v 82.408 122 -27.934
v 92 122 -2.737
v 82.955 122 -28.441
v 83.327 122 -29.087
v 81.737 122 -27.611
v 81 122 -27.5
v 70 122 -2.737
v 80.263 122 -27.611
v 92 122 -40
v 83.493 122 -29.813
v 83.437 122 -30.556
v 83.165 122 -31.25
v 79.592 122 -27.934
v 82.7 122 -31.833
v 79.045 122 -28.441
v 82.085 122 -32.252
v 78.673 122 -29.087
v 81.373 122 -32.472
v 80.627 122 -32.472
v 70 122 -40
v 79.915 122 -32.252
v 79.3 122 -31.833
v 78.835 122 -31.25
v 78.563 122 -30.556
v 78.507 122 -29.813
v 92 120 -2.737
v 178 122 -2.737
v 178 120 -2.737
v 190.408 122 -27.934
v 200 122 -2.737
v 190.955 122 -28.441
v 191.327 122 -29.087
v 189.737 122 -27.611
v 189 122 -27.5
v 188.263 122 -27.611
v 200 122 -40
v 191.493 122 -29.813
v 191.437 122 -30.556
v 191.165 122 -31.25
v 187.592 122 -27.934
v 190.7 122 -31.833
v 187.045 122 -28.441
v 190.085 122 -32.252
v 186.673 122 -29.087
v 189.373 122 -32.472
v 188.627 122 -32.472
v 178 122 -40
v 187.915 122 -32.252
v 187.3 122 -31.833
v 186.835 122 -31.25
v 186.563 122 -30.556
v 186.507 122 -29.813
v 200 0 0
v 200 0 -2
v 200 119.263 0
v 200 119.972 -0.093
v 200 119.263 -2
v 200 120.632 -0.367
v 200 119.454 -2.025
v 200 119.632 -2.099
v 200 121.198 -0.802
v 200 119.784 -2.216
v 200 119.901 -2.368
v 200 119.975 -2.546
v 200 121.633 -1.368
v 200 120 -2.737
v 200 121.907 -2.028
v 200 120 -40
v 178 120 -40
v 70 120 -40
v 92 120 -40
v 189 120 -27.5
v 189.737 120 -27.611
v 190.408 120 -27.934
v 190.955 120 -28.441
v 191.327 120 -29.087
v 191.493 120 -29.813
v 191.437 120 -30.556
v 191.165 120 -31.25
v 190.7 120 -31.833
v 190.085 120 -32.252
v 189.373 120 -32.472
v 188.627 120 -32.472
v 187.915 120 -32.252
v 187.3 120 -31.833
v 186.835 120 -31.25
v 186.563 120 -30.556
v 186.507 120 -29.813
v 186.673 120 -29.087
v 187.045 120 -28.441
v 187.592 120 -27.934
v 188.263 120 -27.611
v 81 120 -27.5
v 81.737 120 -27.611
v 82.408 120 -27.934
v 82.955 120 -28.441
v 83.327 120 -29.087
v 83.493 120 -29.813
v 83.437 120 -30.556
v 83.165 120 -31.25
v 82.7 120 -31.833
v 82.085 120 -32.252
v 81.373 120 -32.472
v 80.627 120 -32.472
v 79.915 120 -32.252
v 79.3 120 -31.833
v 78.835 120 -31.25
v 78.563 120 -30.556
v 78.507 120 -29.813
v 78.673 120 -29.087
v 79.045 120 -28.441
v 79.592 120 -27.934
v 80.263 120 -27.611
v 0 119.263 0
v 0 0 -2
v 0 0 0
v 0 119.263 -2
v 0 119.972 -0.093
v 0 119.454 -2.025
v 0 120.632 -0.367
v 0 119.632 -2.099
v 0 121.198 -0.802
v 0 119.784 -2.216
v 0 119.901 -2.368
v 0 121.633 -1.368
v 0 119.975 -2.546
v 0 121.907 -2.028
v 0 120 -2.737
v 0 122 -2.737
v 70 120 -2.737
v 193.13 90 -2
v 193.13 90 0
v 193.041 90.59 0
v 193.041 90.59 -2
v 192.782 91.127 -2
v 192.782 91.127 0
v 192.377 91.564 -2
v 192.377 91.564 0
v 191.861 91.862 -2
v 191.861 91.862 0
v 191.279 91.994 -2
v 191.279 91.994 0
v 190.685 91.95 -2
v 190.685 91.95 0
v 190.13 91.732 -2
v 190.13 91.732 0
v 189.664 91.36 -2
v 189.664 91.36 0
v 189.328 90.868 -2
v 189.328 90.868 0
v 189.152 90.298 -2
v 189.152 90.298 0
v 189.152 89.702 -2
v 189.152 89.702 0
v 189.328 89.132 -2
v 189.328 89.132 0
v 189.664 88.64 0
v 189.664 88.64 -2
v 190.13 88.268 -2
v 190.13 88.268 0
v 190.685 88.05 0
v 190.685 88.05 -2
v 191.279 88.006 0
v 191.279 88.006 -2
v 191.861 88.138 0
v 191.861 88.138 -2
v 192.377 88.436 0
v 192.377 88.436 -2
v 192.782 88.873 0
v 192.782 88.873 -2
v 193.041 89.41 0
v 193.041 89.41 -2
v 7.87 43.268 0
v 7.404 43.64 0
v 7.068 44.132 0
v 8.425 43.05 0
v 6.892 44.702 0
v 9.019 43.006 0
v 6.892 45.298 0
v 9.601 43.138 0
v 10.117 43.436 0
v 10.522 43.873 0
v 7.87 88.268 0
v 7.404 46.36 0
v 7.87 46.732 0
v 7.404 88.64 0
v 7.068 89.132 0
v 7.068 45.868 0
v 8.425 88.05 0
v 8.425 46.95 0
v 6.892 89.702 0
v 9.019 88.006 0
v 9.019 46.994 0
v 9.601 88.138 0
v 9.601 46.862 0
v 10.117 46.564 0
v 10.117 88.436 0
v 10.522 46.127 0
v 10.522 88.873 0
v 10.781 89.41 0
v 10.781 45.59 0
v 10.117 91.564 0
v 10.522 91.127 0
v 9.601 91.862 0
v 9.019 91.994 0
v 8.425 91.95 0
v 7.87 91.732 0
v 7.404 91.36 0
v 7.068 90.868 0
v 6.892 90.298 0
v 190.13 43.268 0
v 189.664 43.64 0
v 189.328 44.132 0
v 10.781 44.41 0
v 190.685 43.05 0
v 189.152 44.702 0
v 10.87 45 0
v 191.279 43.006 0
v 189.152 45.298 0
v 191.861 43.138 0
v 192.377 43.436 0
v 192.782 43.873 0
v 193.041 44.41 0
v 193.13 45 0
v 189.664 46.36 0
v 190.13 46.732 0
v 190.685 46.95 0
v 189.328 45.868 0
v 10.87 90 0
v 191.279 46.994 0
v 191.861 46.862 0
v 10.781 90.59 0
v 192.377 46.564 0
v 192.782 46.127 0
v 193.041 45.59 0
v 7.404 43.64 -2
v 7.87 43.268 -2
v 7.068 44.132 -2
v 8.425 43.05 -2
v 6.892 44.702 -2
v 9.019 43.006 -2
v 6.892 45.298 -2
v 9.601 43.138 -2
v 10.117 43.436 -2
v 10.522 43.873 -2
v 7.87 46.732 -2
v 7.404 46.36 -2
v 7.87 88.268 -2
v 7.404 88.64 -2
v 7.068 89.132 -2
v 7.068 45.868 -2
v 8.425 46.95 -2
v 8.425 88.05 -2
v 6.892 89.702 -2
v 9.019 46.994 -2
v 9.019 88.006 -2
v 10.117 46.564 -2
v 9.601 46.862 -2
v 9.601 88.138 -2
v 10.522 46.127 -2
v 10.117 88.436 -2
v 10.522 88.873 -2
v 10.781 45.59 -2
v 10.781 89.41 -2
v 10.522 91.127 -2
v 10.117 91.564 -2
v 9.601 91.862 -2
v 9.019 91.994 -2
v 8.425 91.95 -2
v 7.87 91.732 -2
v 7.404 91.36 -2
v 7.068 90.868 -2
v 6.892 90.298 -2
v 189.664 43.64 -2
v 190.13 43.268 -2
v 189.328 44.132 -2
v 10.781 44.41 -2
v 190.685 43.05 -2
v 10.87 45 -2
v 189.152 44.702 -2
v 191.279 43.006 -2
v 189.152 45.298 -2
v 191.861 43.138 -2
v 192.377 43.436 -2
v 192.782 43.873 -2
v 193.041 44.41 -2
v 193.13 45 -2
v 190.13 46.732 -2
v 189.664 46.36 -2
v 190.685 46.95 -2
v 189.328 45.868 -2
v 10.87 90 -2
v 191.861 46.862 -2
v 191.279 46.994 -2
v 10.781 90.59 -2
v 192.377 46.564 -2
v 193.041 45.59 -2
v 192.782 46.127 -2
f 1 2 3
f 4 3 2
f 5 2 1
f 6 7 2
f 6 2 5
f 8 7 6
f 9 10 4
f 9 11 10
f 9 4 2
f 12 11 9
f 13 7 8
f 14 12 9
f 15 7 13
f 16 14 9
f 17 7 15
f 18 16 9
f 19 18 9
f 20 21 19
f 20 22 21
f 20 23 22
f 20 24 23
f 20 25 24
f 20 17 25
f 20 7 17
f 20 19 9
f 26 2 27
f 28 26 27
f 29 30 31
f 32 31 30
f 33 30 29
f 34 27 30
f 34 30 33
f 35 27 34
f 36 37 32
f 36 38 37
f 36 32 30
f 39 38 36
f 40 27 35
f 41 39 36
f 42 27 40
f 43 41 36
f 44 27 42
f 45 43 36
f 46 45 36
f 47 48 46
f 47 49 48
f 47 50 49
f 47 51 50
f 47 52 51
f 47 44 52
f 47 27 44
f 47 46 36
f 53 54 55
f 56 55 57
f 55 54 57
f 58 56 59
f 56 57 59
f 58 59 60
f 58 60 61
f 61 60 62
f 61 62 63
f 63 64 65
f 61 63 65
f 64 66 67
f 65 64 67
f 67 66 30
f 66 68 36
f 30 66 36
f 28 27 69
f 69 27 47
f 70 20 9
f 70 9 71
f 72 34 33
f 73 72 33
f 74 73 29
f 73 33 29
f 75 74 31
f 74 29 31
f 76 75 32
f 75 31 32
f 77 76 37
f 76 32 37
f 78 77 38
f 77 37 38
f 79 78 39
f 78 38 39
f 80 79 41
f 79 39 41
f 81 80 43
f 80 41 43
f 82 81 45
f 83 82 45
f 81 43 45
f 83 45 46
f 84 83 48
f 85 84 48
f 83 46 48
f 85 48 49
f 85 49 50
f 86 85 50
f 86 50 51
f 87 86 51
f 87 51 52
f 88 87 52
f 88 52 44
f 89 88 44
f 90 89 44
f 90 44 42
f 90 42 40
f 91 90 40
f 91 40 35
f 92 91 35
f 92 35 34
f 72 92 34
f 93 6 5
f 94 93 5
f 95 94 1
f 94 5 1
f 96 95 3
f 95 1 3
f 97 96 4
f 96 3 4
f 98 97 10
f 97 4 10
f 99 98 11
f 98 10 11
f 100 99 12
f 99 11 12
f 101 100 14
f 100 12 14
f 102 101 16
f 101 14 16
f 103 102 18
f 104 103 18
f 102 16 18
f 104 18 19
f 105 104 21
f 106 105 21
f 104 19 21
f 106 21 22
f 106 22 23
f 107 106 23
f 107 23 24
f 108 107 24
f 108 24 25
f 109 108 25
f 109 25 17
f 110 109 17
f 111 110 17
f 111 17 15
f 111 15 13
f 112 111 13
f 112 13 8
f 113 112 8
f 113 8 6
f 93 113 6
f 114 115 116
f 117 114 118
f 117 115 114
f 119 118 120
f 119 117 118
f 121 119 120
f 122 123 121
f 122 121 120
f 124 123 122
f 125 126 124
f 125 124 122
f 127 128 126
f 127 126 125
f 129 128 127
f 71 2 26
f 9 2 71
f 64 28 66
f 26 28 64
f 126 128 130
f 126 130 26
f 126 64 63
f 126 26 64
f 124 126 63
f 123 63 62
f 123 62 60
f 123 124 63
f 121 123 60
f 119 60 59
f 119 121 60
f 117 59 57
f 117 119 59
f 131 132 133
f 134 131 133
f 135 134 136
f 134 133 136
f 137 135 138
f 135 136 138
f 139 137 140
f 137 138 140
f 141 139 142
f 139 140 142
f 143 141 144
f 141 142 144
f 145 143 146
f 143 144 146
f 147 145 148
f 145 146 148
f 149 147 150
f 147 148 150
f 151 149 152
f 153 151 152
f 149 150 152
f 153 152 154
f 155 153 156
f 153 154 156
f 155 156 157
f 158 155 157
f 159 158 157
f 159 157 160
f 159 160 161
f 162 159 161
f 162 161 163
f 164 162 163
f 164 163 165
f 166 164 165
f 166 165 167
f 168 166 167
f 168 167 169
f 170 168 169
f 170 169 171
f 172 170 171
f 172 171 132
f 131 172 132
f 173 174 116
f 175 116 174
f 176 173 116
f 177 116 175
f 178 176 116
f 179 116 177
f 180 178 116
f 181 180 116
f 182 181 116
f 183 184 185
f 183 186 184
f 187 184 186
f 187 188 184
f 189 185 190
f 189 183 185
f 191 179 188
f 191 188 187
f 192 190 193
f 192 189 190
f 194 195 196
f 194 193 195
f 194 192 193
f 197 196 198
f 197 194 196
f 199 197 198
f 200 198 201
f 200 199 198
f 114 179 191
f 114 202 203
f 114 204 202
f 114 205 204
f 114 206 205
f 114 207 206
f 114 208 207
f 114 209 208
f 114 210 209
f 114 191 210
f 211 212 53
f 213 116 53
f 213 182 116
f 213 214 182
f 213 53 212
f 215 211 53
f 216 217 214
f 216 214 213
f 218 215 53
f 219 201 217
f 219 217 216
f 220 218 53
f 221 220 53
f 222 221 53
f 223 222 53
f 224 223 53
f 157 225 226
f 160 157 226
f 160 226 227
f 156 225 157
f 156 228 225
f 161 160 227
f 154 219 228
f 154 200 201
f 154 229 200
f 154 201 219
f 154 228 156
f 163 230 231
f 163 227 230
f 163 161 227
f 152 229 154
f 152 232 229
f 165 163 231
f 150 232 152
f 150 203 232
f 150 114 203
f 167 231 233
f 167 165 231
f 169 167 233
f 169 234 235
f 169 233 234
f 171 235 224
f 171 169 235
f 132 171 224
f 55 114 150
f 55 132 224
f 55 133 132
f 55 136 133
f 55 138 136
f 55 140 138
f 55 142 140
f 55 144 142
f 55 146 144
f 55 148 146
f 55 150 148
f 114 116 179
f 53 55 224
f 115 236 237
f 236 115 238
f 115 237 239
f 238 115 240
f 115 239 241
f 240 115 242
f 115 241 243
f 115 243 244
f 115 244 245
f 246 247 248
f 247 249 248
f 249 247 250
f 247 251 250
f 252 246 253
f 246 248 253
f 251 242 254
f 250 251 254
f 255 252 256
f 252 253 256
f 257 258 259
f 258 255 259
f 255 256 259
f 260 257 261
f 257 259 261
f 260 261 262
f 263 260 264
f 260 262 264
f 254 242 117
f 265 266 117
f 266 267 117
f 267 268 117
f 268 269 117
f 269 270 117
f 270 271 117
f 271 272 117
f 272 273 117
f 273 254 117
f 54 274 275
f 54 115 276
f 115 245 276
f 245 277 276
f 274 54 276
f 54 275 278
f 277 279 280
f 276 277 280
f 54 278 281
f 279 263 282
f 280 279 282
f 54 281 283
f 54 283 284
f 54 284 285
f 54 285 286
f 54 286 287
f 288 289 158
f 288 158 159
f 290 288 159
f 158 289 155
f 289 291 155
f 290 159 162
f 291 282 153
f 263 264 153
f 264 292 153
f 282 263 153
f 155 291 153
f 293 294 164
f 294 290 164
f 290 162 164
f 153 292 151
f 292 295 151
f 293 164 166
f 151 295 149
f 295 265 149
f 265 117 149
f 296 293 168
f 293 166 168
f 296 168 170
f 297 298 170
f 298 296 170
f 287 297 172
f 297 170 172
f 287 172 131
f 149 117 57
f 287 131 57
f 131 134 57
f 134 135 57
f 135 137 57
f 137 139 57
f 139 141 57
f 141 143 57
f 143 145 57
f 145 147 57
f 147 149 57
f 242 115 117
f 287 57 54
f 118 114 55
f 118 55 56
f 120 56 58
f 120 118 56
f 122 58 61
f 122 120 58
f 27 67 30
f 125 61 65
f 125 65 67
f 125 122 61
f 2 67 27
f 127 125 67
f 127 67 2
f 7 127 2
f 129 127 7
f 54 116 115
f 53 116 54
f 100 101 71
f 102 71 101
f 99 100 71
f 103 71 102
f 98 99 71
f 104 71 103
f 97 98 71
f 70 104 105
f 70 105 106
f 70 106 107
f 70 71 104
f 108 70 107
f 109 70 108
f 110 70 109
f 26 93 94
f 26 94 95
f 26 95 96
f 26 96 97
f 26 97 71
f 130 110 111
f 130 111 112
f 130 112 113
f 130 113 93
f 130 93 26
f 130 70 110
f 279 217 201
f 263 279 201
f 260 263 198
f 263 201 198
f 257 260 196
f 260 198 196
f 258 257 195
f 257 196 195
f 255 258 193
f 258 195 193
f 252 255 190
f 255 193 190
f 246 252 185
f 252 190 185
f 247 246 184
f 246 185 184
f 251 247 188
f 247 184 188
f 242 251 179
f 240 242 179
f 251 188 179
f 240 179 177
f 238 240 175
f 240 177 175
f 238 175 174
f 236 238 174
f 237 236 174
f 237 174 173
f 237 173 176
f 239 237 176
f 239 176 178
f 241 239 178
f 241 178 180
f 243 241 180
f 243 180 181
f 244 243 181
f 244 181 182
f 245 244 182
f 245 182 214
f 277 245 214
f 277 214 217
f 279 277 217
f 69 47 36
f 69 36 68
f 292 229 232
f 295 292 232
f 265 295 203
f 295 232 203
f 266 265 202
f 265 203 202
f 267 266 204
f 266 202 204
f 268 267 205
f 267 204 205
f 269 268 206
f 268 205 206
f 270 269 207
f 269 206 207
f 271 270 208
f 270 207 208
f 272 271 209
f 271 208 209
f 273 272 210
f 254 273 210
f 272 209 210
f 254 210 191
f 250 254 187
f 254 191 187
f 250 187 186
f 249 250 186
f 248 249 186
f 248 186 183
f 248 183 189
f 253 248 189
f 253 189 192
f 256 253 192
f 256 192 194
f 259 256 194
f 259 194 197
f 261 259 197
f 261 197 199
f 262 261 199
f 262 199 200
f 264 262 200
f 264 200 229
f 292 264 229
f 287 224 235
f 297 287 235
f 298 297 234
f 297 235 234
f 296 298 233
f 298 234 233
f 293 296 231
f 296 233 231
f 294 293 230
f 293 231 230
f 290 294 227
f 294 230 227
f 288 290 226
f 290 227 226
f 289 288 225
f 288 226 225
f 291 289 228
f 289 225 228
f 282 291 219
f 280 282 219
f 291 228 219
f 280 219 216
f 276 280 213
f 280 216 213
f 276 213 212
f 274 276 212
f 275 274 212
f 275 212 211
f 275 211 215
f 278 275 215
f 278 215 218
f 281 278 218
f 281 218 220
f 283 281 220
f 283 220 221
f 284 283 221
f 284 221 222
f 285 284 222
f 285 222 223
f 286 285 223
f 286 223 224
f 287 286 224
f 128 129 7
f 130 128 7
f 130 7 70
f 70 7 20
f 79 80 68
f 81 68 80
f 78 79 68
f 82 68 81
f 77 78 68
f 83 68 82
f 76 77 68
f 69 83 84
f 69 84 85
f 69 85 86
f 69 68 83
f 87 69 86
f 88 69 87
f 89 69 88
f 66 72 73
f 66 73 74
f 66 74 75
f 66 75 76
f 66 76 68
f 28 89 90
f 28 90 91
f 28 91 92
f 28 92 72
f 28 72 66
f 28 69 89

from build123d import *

# Parameters (mm, degrees)
SKETCH2_W                    = 200
SKETCH2_H                    = 120
BASE_FLANGE1_DEPTH           = 2
CUT_EXTRUDE1_REACH           = 235.247
SKETCH7_R                    = 2
EDGE_FLANGE1_STRIP_W         = 9.4732
EDGE_FLANGE1_STRIP_H         = 2
EDGE_FLANGE1_STRIP_CUT_DEPTH = 200
EDGE_FLANGE1_DEPTH           = 200
CUT_EXTRUDE2_REACH           = 239.664
SKETCH11_R                   = 2.5
SKETCH11_W                   = 86
SKETCH11_H                   = 37.2634
SKETCH11_W_2                 = 70


# Sheet-metal steps are written as plain solids
with BuildPart() as part:
    # Sketch2 → Base-Flange1 (new body)
    with BuildSketch(Plane.XY):
        with Locations((100, 60)):
            Rectangle(SKETCH2_W, SKETCH2_H)
    extrude(amount=-BASE_FLANGE1_DEPTH)

    # Sketch7 → Cut-Extrude1 (cut, up to next)
    with BuildSketch(Plane.XY, mode=Mode.PRIVATE) as cut_extrude1_sk1:
        with Locations((8.87, 90)):
            Circle(SKETCH7_R)
    cut_extrude1_tool1 = extrude(cut_extrude1_sk1.sketch, amount=-CUT_EXTRUDE1_REACH, mode=Mode.PRIVATE) & part.part
    # Sketch7 → Cut-Extrude1 (cut, up to next)
    with BuildSketch(Plane.XY, mode=Mode.PRIVATE) as cut_extrude1_sk2:
        with Locations((8.87, 45)):
            Circle(SKETCH7_R)
    cut_extrude1_tool2 = extrude(cut_extrude1_sk2.sketch, amount=-CUT_EXTRUDE1_REACH, mode=Mode.PRIVATE) & part.part
    # Sketch7 → Cut-Extrude1 (cut, up to next)
    with BuildSketch(Plane.XY, mode=Mode.PRIVATE) as cut_extrude1_sk3:
        with Locations((191.13, 45)):
            Circle(SKETCH7_R)
    cut_extrude1_tool3 = extrude(cut_extrude1_sk3.sketch, amount=-CUT_EXTRUDE1_REACH, mode=Mode.PRIVATE) & part.part
    # Sketch7 → Cut-Extrude1 (cut, up to next)
    with BuildSketch(Plane.XY, mode=Mode.PRIVATE) as cut_extrude1_sk4:
        with Locations((191.13, 90)):
            Circle(SKETCH7_R)
    cut_extrude1_tool4 = extrude(cut_extrude1_sk4.sketch, amount=-CUT_EXTRUDE1_REACH, mode=Mode.PRIVATE) & part.part
    add(cut_extrude1_tool1.solids().sort_by_distance((8.87, 90, 0))[0], mode=Mode.SUBTRACT)
    add(cut_extrude1_tool2.solids().sort_by_distance((8.87, 45, 0))[0], mode=Mode.SUBTRACT)
    add(cut_extrude1_tool3.solids().sort_by_distance((191.13, 45, 0))[0], mode=Mode.SUBTRACT)
    add(cut_extrude1_tool4.solids().sort_by_distance((191.13, 90, 0))[0], mode=Mode.SUBTRACT)

    # Edge-Flange1 strip (across the edge) → Edge-Flange1 strip cut (cut)
    with BuildSketch(Plane(origin=(0, 120, -2), x_dir=(0, -1, 0), z_dir=(1, 0, 0))):
        with Locations((-4, -1)):
            Rectangle(EDGE_FLANGE1_STRIP_W, EDGE_FLANGE1_STRIP_H)
    extrude(amount=EDGE_FLANGE1_STRIP_CUT_DEPTH, mode=Mode.SUBTRACT)

    # Edge-Flange1 section (across the edge) → Edge-Flange1 (add)
    with BuildSketch(Plane(origin=(0, 120, -2), x_dir=(0, -1, 0), z_dir=(1, 0, 0))):
        with BuildLine():
            Line((-2, 0.7366), (-2, 38))
            Line((-2, 38), (0, 38))
            Line((0, 38), (0, 0.7366))
            ThreePointArc((0, 0.7366), (0.215745145, 0.215745145), (0.7366, 0))
            Line((0.7366, 0), (0.7366, -2))
            ThreePointArc((0.7366, -2), (-1.198468417, -1.198468417), (-2, 0.7366))
        make_face()
    extrude(amount=EDGE_FLANGE1_DEPTH)

    # Sketch11 → Cut-Extrude2 (cut, up to next)
    with BuildSketch(Plane(origin=(0, 122, 0), x_dir=(1, 0, 0), z_dir=(0, 1, 0)), mode=Mode.PRIVATE) as cut_extrude2_sk1:
        with Locations(Location((189, 30, 0), (0, 0, 270))):
            Circle(SKETCH11_R)
    cut_extrude2_tool1 = extrude(cut_extrude2_sk1.sketch, amount=-CUT_EXTRUDE2_REACH, mode=Mode.PRIVATE) & part.part
    # Sketch11 → Cut-Extrude2 (cut, up to next)
    with BuildSketch(Plane(origin=(0, 122, 0), x_dir=(1, 0, 0), z_dir=(0, 1, 0)), mode=Mode.PRIVATE) as cut_extrude2_sk2:
        with Locations(Location((81, 30, 0), (0, 0, 270))):
            Circle(SKETCH11_R)
    cut_extrude2_tool2 = extrude(cut_extrude2_sk2.sketch, amount=-CUT_EXTRUDE2_REACH, mode=Mode.PRIVATE) & part.part
    # Sketch11 → Cut-Extrude2 (cut, up to next)
    with BuildSketch(Plane(origin=(0, 122, 0), x_dir=(1, 0, 0), z_dir=(0, 1, 0)), mode=Mode.PRIVATE) as cut_extrude2_sk3:
        with Locations((135, 21.3683)):
            Rectangle(SKETCH11_W, SKETCH11_H)
    cut_extrude2_tool3 = extrude(cut_extrude2_sk3.sketch, amount=-CUT_EXTRUDE2_REACH, mode=Mode.PRIVATE) & part.part
    # Sketch11 → Cut-Extrude2 (cut, up to next)
    with BuildSketch(Plane(origin=(0, 122, 0), x_dir=(1, 0, 0), z_dir=(0, 1, 0)), mode=Mode.PRIVATE) as cut_extrude2_sk4:
        with Locations((35, 21.3683)):
            Rectangle(SKETCH11_W_2, SKETCH11_H)
    cut_extrude2_tool4 = extrude(cut_extrude2_sk4.sketch, amount=-CUT_EXTRUDE2_REACH, mode=Mode.PRIVATE) & part.part
    add(cut_extrude2_tool1.solids().sort_by_distance((189, 122, -30))[0], mode=Mode.SUBTRACT)
    add(cut_extrude2_tool2.solids().sort_by_distance((81, 122, -30))[0], mode=Mode.SUBTRACT)
    add(cut_extrude2_tool3.solids().sort_by_distance((135, 122, -21.3683))[0], mode=Mode.SUBTRACT)
    add(cut_extrude2_tool4.solids().sort_by_distance((35, 122, -21.3683))[0], mode=Mode.SUBTRACT)


solid = part.part
